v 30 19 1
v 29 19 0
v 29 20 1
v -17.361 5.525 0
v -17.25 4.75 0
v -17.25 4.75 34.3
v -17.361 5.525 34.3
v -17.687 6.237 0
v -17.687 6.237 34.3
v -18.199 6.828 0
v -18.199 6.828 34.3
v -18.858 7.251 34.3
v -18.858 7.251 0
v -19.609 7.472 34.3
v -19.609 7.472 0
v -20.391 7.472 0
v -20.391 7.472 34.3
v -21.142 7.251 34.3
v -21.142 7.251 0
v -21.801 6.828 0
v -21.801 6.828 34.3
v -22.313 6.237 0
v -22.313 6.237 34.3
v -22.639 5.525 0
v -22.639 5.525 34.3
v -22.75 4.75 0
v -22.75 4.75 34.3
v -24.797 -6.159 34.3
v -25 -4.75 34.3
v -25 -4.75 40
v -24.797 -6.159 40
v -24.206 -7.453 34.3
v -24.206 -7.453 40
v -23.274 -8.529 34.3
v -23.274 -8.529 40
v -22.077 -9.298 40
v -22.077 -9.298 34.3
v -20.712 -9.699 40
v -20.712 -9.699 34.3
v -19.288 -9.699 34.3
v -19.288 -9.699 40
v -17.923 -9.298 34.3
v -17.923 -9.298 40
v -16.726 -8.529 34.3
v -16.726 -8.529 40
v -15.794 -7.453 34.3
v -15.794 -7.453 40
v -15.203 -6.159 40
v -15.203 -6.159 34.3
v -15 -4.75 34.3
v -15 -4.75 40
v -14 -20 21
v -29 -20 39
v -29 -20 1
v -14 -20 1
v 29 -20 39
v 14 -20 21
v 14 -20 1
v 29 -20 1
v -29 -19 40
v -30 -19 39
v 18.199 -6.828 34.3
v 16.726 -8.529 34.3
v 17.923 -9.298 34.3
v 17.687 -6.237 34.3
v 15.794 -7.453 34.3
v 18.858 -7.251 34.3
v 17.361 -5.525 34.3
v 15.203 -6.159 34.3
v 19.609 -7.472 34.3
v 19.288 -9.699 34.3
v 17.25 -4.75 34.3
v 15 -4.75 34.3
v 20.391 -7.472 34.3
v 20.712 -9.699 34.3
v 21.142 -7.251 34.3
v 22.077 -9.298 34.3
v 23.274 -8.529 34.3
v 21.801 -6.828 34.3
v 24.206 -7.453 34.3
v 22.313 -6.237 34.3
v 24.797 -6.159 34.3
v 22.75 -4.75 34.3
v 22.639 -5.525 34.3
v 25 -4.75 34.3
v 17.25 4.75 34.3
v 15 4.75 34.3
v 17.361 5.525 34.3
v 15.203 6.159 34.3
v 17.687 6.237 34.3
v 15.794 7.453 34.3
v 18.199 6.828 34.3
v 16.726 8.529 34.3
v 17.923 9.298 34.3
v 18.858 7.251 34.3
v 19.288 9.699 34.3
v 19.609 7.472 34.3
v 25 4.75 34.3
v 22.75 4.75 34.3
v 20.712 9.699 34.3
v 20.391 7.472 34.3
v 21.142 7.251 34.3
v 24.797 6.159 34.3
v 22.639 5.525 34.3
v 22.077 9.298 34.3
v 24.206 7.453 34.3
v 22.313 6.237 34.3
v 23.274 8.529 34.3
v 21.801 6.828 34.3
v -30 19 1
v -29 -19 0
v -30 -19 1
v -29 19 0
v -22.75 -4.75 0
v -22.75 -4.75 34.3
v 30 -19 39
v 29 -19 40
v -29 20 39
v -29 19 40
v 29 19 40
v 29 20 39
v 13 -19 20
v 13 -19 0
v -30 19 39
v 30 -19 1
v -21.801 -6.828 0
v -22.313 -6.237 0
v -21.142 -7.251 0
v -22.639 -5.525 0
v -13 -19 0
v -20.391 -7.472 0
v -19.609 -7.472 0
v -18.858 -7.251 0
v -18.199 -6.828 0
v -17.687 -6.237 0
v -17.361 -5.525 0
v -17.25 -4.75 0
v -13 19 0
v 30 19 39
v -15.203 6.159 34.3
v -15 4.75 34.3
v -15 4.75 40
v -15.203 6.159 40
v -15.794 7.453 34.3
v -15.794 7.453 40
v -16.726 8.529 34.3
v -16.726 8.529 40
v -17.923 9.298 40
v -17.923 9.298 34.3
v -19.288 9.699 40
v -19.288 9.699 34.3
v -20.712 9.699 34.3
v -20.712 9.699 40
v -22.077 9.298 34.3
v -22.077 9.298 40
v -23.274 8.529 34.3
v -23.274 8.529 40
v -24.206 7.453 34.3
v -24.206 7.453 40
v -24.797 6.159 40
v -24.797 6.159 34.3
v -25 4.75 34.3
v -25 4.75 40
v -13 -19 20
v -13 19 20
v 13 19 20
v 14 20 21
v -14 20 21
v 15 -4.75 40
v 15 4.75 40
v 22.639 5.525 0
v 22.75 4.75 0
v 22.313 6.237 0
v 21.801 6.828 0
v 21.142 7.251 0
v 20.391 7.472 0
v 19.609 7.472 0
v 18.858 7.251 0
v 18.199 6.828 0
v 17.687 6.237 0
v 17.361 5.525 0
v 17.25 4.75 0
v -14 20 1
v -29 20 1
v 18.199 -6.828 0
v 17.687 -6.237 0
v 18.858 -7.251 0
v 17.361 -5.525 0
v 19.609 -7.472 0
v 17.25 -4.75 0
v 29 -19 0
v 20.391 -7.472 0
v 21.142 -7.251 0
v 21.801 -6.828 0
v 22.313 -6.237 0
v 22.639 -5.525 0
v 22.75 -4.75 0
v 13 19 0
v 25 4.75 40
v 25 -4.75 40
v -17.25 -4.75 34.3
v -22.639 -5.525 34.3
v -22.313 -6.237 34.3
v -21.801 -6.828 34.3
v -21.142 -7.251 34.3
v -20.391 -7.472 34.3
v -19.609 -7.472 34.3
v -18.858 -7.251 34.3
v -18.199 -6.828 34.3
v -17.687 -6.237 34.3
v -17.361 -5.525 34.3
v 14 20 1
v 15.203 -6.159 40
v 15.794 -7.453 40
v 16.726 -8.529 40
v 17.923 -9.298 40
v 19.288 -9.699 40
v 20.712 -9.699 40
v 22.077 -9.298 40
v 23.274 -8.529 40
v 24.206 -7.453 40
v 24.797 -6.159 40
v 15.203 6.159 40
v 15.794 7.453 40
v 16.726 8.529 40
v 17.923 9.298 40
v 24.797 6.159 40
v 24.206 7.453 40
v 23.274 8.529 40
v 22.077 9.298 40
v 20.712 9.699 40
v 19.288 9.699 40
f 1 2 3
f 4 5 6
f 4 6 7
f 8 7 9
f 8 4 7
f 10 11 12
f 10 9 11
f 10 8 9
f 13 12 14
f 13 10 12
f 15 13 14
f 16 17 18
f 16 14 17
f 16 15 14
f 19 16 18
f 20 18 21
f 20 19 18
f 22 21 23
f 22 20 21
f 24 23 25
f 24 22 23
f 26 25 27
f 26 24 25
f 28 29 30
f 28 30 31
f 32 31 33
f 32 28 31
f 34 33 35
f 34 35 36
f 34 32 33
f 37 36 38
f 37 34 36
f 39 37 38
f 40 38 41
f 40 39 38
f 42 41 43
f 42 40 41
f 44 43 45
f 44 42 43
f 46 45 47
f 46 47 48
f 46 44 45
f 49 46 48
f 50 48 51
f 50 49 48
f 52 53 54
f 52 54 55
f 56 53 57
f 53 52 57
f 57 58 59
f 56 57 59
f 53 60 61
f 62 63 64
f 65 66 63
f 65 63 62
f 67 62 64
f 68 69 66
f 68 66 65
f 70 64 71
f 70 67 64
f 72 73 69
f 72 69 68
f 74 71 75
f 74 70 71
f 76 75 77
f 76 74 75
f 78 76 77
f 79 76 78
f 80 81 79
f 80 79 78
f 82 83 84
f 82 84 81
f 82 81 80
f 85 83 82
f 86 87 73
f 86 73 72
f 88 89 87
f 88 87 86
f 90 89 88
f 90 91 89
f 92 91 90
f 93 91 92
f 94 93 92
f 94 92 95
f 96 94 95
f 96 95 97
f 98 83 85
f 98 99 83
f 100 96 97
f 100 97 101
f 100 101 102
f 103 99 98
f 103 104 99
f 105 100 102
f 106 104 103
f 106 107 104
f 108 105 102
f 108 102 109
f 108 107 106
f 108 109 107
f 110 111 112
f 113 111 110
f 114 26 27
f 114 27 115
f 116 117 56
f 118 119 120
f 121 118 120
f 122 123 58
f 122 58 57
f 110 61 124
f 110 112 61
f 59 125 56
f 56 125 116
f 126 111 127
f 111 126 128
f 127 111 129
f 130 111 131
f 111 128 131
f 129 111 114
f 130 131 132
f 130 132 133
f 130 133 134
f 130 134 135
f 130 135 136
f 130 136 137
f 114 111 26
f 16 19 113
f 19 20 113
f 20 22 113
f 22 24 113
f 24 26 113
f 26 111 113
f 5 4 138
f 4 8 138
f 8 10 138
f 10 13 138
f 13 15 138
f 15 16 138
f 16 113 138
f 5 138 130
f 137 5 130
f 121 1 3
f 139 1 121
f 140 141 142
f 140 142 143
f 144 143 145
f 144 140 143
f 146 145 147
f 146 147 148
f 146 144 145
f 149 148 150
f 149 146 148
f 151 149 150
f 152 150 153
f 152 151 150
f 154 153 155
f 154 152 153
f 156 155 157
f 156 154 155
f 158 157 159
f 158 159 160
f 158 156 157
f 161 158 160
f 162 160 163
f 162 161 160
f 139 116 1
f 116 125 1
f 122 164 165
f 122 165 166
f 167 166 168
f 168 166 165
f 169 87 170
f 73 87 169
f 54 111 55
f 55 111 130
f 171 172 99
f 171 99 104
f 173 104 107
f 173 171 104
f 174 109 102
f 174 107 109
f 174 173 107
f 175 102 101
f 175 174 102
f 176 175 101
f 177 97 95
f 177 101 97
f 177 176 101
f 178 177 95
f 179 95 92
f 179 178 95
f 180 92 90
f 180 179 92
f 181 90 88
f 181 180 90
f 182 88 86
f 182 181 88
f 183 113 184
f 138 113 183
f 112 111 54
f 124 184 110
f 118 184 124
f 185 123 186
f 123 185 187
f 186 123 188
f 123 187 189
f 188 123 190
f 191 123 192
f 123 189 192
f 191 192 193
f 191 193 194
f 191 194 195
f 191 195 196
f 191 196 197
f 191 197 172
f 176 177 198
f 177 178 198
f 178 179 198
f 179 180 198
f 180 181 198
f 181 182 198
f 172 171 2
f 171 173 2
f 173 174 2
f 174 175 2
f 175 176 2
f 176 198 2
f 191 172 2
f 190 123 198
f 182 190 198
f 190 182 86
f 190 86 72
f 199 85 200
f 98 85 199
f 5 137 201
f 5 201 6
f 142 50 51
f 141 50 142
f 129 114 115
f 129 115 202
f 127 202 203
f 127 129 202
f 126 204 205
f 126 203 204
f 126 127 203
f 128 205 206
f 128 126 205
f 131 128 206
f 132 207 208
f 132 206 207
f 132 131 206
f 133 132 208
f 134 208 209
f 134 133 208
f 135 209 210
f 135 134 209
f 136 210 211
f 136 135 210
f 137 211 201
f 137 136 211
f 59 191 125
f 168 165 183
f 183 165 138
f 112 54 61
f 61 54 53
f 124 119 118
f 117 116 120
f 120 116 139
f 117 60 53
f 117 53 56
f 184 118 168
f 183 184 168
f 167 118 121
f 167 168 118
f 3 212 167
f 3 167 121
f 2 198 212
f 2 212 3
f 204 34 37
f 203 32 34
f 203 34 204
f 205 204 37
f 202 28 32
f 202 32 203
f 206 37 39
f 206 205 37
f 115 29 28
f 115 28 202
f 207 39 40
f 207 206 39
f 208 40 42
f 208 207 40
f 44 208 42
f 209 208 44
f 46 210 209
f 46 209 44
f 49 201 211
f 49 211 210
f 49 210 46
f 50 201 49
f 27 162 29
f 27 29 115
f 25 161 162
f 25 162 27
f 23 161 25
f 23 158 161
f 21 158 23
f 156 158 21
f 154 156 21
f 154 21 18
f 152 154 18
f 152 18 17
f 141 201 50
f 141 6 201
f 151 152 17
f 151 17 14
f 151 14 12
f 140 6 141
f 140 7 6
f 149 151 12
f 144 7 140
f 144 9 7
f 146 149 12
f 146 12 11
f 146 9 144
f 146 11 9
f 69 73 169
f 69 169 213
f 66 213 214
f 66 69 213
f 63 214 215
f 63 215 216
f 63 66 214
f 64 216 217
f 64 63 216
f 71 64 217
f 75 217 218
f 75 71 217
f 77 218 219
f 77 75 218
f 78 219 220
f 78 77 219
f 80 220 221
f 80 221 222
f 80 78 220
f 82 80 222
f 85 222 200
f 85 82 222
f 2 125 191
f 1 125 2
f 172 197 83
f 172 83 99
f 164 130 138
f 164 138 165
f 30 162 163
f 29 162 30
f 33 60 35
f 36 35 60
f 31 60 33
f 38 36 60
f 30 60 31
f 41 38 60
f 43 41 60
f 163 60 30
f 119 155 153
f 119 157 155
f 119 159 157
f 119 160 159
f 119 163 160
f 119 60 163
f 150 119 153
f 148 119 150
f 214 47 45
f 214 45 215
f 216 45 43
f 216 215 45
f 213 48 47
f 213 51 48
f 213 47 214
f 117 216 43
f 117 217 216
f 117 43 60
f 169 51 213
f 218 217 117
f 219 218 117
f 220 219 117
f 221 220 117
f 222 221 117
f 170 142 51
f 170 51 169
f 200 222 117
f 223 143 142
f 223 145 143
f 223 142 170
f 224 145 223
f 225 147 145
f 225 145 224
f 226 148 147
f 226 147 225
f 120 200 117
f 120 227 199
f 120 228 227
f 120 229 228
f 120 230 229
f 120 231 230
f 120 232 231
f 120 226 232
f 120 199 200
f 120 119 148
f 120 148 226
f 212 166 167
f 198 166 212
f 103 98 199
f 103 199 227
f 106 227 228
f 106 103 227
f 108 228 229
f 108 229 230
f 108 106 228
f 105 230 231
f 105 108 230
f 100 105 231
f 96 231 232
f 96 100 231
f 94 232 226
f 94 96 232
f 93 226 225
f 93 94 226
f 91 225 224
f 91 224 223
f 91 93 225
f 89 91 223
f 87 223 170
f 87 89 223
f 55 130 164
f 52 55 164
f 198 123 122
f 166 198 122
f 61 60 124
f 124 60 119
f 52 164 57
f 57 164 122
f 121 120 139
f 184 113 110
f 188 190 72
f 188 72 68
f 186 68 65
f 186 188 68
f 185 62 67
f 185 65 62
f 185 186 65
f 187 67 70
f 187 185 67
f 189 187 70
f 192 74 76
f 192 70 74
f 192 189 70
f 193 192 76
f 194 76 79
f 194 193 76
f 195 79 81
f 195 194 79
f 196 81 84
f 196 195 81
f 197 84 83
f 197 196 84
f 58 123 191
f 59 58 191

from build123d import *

# Parameters (mm, degrees)
SKETCH_1_W            = 60
SKETCH_1_H            = 40
EXTRUDE_1_DEPTH       = 40
HOLE_WIZARD_5_DEPTH   = 40
HOLE_START            = 34.3
HOLE_WIZARD_5_2_DEPTH = 5.7
SKETCH_9_W            = 26
SKETCH_9_H            = 20
CUT_EXTRUDE_1_DEPTH   = 65.031242374
CHAMFER_1_SIZE        = 1


# Read off the part's stored shape, not the designer's step: 打孔尺寸(%根据)内六角圆柱头螺钉的类型5
with BuildPart() as part:
    # 草图1 → 凸台-拉伸1 (new body)
    with BuildSketch(Plane.XY):
        Rectangle(SKETCH_1_W, SKETCH_1_H)
    extrude(amount=EXTRUDE_1_DEPTH)

    # 打孔尺寸(%根据)内六角圆柱头螺钉的类型5 outline → 打孔尺寸(%根据)内六角圆柱头螺钉的类型5 (cut)
    with BuildSketch(Plane.XY):
        with BuildLine():
            Line((17.25, 4.75), (17.25, -4.75))
            ThreePointArc((17.25, -4.75), (20, -7.5), (22.75, -4.75))
            Line((22.75, -4.75), (22.75, 4.75))
            ThreePointArc((22.75, 4.75), (20, 7.5), (17.25, 4.75))
        make_face()
        with BuildLine():
            Line((-22.75, 4.75), (-22.75, -4.75))
            ThreePointArc((-22.75, -4.75), (-20, -7.5), (-17.25, -4.75))
            Line((-17.25, -4.75), (-17.25, 4.75))
            ThreePointArc((-17.25, 4.75), (-20, 7.5), (-22.75, 4.75))
        make_face()
    extrude(amount=HOLE_WIZARD_5_DEPTH, mode=Mode.SUBTRACT)

    # Hole Wizard 5 2 outline → Hole Wizard 5 2 (cut)
    # profile 1 of 2: a face of its own
    with BuildSketch(Plane.XY.offset(HOLE_START)):
        with BuildLine():
            Line((15, 4.75), (15, -4.75))
            ThreePointArc((15, -4.75), (20, -9.75), (25, -4.75))
            Line((25, -4.75), (25, 4.75))
            ThreePointArc((25, 4.75), (20, 9.75), (15, 4.75))
        make_face()
        with BuildLine():
            ThreePointArc((22.75, -4.75), (20, -7.5), (17.25, -4.75))
            Line((17.25, -4.75), (17.25, 4.75))
            ThreePointArc((17.25, 4.75), (20, 7.5), (22.75, 4.75))
            Line((22.75, 4.75), (22.75, -4.75))
        make_face(mode=Mode.SUBTRACT)
    # profile 2 of 2: a face of its own
    with BuildSketch(Plane.XY.offset(HOLE_START)):
        with BuildLine():
            Line((-25, 4.75), (-25, -4.75))
            ThreePointArc((-25, -4.75), (-20, -9.75), (-15, -4.75))
            Line((-15, -4.75), (-15, 4.75))
            ThreePointArc((-15, 4.75), (-20, 9.75), (-25, 4.75))
        make_face()
        with BuildLine():
            ThreePointArc((-17.25, -4.75), (-20, -7.5), (-22.75, -4.75))
            Line((-22.75, -4.75), (-22.75, 4.75))
            ThreePointArc((-22.75, 4.75), (-20, 7.5), (-17.25, 4.75))
            Line((-17.25, 4.75), (-17.25, -4.75))
        make_face(mode=Mode.SUBTRACT)
    extrude(amount=HOLE_WIZARD_5_2_DEPTH, mode=Mode.SUBTRACT)

    # 草图9 → 切除-拉伸1 (cut, through all)
    with BuildSketch(Plane.XZ.offset(20)):
        with Locations((0, 10)):
            Rectangle(SKETCH_9_W, SKETCH_9_H)
    extrude(amount=-CUT_EXTRUDE_1_DEPTH, mode=Mode.SUBTRACT)

    # 倒角1
    chamfer_1_edges = [part.edges().sort_by_distance(p)[0] for p in [
        (-30, 0, 40),
        (0, -20, 40),
        (30, 0, 40),
        (-21.5, -20, 0),
        (-30, 0, 0),
        (21.5, 20, 0),
        (21.5, -20, 0),
        (-21.5, 20, 0),
        (30, 0, 0),
        (13, 20, 10),
        (-13, 20, 10),
        (0, 20, 20),
        (13, -20, 10),
        (0, -20, 20),
        (-13, -20, 10),
        (0, 20, 40),
        (30, -20, 20),
        (-30, -20, 20),
        (-30, 20, 20),
        (30, 20, 20),
    ]]
    chamfer(chamfer_1_edges, length=CHAMFER_1_SIZE)


solid = part.part
